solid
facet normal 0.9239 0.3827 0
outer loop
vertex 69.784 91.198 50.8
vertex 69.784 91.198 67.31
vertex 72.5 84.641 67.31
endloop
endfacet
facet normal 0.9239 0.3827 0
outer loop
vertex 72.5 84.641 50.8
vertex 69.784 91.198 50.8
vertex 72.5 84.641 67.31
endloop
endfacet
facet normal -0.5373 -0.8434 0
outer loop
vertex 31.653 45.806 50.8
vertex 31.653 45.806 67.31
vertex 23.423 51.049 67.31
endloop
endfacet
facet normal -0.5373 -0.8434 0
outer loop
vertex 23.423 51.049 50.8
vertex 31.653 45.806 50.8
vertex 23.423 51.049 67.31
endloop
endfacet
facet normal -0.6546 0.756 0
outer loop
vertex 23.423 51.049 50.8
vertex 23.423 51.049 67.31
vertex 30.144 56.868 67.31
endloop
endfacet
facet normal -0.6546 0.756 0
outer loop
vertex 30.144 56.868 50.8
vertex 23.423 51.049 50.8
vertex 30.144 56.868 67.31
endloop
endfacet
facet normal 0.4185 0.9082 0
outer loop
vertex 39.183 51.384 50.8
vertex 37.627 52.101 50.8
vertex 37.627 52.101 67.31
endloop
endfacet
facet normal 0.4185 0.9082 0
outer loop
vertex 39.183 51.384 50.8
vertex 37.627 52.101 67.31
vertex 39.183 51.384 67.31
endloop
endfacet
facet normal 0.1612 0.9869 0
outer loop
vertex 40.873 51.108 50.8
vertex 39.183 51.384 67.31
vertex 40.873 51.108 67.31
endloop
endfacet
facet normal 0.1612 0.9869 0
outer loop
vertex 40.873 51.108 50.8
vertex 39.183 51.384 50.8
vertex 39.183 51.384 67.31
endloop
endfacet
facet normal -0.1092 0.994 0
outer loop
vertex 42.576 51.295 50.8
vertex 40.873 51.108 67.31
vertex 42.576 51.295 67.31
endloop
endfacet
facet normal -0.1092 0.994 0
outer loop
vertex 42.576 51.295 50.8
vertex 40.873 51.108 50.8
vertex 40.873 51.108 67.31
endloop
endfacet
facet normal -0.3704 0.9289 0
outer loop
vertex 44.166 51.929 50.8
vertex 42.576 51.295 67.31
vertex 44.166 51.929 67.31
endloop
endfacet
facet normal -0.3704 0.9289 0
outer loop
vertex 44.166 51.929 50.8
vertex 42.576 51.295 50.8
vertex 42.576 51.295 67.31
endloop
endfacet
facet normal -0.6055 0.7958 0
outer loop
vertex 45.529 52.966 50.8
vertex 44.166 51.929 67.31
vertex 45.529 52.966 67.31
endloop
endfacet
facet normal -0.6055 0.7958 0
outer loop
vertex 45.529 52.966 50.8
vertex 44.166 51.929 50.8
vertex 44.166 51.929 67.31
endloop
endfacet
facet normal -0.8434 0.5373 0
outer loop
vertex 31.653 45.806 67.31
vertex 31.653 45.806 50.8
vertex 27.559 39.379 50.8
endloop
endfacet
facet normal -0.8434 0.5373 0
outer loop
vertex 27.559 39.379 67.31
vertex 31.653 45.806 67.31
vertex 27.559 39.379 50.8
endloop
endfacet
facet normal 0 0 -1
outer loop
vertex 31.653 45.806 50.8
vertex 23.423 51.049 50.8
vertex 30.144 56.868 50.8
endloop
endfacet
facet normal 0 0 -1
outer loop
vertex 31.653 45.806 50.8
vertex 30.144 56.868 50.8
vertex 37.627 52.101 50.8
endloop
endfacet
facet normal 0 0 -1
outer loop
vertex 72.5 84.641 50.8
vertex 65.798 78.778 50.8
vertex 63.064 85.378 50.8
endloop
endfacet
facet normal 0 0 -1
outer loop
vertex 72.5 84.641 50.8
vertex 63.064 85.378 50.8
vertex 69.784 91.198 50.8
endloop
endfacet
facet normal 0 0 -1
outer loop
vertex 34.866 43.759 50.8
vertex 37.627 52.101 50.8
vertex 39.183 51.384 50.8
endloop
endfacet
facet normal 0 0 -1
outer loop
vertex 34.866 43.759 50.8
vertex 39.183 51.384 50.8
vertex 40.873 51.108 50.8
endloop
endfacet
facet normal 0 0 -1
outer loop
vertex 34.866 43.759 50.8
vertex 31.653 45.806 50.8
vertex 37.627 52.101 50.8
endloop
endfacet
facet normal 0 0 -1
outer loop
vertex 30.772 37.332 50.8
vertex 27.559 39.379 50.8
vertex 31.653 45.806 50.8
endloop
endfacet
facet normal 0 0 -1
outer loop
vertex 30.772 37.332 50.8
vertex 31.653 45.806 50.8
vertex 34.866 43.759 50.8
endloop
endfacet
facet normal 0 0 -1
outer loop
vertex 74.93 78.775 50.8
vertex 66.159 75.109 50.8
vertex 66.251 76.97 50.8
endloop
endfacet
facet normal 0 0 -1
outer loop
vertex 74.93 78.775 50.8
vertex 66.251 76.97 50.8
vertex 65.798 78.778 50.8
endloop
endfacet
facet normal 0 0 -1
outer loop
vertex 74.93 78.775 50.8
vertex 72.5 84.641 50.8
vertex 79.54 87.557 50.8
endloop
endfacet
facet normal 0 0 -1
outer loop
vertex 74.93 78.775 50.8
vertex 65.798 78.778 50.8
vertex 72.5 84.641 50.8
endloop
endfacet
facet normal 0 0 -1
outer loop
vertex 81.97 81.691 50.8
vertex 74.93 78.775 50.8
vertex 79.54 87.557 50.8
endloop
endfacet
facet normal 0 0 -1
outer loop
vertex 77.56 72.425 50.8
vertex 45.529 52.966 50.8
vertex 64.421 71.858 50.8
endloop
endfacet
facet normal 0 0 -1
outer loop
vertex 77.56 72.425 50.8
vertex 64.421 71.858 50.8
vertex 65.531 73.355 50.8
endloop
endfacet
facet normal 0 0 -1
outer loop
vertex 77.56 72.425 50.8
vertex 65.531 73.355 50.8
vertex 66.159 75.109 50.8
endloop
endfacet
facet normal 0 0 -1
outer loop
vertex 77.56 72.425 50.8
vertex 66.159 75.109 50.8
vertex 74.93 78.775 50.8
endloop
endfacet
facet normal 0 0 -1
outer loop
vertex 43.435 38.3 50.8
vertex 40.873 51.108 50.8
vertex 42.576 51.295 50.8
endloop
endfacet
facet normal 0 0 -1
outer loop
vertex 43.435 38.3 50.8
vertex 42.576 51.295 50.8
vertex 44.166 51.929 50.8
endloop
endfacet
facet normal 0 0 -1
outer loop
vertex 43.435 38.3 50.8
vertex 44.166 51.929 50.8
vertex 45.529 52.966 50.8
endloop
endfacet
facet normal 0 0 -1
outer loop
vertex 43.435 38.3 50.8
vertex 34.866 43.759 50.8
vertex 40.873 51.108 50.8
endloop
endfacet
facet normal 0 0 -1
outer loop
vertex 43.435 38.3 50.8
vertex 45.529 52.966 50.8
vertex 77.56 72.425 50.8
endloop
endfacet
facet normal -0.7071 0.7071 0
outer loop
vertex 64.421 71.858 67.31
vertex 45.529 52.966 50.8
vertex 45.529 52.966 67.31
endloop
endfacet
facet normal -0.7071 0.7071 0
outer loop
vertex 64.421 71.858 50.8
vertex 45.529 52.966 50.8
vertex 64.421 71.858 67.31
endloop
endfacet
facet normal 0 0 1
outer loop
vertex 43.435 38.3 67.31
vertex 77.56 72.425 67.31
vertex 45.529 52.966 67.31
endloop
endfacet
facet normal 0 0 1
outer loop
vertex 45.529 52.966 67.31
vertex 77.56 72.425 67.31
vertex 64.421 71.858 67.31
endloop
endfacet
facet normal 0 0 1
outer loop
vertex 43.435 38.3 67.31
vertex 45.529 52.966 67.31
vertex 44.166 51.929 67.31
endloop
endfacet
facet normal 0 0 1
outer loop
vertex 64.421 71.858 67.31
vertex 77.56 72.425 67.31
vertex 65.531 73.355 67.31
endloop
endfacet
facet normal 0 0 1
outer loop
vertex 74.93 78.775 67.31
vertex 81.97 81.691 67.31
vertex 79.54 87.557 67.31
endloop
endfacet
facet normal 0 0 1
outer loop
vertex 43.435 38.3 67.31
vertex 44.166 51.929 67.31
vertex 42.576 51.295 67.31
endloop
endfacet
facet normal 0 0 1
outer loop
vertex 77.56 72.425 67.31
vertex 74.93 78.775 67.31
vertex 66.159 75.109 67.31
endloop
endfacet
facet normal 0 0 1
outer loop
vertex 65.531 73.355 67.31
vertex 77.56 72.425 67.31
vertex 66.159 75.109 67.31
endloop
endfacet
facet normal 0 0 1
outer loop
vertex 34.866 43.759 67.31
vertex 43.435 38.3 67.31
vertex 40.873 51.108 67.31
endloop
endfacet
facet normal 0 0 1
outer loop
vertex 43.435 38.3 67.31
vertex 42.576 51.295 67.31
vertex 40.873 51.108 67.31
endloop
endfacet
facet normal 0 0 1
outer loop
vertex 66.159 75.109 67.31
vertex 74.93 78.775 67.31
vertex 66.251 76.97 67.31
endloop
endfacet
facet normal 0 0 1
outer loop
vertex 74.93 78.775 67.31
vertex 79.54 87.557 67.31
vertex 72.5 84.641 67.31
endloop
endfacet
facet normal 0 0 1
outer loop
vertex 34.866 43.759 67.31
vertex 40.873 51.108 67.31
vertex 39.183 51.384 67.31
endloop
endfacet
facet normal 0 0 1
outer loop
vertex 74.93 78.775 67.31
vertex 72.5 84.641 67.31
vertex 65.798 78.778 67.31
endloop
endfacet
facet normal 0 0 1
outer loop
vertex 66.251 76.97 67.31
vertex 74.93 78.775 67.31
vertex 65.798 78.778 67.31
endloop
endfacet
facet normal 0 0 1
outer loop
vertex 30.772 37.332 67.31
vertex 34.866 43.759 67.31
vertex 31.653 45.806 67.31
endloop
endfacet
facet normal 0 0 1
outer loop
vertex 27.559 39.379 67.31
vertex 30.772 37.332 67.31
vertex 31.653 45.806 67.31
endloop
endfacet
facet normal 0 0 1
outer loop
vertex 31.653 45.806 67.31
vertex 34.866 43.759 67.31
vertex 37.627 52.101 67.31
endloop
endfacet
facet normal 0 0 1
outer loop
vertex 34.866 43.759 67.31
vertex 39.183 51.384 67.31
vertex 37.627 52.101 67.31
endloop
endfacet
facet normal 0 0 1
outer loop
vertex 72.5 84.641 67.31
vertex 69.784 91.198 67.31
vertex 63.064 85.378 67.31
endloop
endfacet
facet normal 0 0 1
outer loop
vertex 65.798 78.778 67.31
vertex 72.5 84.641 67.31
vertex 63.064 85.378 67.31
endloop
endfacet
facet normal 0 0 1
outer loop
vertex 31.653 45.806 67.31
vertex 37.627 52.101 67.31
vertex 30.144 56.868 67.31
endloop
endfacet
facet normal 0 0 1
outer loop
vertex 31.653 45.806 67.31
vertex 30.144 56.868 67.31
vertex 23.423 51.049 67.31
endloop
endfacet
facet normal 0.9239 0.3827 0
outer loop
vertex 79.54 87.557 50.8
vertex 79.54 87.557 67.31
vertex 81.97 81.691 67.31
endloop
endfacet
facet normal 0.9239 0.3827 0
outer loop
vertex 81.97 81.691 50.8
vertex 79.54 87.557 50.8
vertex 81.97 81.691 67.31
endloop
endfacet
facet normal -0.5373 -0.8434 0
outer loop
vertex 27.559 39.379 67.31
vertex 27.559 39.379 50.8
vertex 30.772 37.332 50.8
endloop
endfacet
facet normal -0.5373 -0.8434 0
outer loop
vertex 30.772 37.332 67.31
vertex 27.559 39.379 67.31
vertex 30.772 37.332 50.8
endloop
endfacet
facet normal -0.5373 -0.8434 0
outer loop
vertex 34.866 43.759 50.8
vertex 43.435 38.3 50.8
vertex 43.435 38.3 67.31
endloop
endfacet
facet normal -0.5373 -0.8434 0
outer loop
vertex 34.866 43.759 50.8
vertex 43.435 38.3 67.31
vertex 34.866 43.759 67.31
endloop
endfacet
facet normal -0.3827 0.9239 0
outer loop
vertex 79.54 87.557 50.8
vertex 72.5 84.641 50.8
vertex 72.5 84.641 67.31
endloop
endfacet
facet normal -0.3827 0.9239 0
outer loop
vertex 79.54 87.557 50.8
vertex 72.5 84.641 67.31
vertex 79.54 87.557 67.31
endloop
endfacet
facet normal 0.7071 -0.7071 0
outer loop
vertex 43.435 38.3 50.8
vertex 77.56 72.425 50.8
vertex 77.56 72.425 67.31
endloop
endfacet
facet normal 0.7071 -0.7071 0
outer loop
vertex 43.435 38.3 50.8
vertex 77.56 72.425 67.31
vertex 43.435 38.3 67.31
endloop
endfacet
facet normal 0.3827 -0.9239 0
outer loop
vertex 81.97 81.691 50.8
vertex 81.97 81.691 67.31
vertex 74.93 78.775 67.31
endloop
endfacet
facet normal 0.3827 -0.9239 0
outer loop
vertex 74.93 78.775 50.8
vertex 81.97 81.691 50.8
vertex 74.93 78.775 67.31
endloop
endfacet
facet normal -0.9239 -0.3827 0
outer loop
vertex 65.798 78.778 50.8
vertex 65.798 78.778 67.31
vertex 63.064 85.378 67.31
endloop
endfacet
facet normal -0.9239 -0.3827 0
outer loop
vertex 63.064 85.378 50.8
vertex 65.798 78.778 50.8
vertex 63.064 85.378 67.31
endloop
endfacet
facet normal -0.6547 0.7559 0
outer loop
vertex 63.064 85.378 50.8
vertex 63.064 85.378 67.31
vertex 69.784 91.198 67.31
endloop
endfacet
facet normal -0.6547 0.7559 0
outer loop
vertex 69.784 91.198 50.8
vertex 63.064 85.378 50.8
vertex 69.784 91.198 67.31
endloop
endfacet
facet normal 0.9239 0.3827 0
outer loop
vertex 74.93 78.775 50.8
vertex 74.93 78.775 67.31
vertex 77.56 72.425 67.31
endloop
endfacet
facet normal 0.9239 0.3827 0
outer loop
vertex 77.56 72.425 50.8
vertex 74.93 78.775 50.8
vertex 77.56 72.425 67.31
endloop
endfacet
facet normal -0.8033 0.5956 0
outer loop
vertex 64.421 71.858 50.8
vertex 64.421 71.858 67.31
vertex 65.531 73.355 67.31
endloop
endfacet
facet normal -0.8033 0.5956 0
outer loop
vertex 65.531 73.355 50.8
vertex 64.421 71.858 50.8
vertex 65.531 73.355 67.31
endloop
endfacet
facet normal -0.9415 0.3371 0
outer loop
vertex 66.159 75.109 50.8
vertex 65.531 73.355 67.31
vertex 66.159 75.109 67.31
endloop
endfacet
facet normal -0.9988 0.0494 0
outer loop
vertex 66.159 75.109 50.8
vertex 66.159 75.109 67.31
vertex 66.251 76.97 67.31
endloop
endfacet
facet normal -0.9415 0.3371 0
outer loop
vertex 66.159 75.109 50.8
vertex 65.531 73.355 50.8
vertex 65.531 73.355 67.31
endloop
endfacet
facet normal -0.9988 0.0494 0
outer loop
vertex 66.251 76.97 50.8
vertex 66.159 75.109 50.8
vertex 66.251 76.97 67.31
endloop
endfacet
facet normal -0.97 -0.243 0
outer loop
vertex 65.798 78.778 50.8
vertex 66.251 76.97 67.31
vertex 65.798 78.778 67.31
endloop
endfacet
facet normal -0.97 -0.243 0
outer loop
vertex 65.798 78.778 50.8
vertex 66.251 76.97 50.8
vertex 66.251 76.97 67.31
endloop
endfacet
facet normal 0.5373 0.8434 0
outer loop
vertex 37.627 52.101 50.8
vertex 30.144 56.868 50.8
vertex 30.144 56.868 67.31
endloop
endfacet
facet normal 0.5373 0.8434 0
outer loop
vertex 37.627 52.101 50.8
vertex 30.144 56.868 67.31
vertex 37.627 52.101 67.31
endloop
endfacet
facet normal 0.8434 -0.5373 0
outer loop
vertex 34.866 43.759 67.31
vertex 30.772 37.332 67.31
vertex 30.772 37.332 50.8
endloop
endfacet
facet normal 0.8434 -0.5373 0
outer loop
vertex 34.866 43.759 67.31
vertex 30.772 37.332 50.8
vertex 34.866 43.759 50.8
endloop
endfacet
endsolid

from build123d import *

# Parameters (mm, degrees)
SKETCH1_W      = 203.2
SKETCH1_H      = 101.6
EXTRUDE1_DEPTH = 50.8
EXTRUDE2_DEPTH = 16.51
SKETCH20_W     = 203.2
SKETCH20_H     = 50.8
EXTRUDE3_DEPTH = 1270


with BuildPart() as part:
    # Sketch1 → Extrude1 (new body)
    with BuildSketch(Plane.XY):
        with Locations((101.6, 50.8)):
            Rectangle(SKETCH1_W, SKETCH1_H)
    extrude(amount=EXTRUDE1_DEPTH)

    # Sketch6 → Extrude2 (add)
    with BuildSketch(Plane.XY.offset(50.8)):
        with BuildLine():
            ThreePointArc((37.627484075, 52.10066287), (41.730641244, 51.143940803), (45.529464649, 52.96607049))
            Line((45.529464649, 52.96607049), (64.421207315, 71.857813157))
            ThreePointArc((64.421207315, 71.857813157), (66.159065786, 75.109117673), (65.797714286, 78.777981013))
            Line((65.797714286, 78.777981013), (63.063921217, 85.377941317))
            Line((63.063921217, 85.377941317), (69.784164904, 91.197771623))
            Line((69.784164904, 91.197771623), (72.499996333, 84.641174554))
            Line((72.499996333, 84.641174554), (79.539958371, 87.557222308))
            Line((79.539958371, 87.557222308), (81.969998167, 81.690587277))
            Line((81.969998167, 81.690587277), (74.930036129, 78.774539522))
            Line((74.930036129, 78.774539522), (77.56029225, 72.424539522))
            Line((77.56029225, 72.424539522), (43.43531899, 38.299566262))
            Line((43.43531899, 38.299566262), (34.866461901, 43.758530283))
            Line((34.866461901, 43.758530283), (37.302310042, 45.218374053))
            Line((37.302310042, 45.218374053), (31.946774361, 48.630226566))
            Line((31.946774361, 48.630226566), (31.653140492, 45.805641791))
            Line((31.653140492, 45.805641791), (23.4233337, 51.04860695))
            Line((23.4233337, 51.04860695), (30.143577387, 56.868437256))
            Line((30.143577387, 56.868437256), (37.627484075, 52.10066287))
        make_face()
        Polygon((31.946774361, 48.630226566), (31.653140492, 45.805641791), (27.558917476, 39.378998974), (30.772238885, 37.331887466), (34.866461901, 43.758530283), (37.302310042, 45.218374053), align=None)
    extrude(amount=EXTRUDE2_DEPTH)

    # Sketch20 → Extrude3 (cut)
    with BuildSketch(Plane.XZ):
        with Locations((101.6, 25.4)):
            Rectangle(SKETCH20_W, SKETCH20_H)
    extrude(amount=-EXTRUDE3_DEPTH, mode=Mode.SUBTRACT)


solid = part.part
